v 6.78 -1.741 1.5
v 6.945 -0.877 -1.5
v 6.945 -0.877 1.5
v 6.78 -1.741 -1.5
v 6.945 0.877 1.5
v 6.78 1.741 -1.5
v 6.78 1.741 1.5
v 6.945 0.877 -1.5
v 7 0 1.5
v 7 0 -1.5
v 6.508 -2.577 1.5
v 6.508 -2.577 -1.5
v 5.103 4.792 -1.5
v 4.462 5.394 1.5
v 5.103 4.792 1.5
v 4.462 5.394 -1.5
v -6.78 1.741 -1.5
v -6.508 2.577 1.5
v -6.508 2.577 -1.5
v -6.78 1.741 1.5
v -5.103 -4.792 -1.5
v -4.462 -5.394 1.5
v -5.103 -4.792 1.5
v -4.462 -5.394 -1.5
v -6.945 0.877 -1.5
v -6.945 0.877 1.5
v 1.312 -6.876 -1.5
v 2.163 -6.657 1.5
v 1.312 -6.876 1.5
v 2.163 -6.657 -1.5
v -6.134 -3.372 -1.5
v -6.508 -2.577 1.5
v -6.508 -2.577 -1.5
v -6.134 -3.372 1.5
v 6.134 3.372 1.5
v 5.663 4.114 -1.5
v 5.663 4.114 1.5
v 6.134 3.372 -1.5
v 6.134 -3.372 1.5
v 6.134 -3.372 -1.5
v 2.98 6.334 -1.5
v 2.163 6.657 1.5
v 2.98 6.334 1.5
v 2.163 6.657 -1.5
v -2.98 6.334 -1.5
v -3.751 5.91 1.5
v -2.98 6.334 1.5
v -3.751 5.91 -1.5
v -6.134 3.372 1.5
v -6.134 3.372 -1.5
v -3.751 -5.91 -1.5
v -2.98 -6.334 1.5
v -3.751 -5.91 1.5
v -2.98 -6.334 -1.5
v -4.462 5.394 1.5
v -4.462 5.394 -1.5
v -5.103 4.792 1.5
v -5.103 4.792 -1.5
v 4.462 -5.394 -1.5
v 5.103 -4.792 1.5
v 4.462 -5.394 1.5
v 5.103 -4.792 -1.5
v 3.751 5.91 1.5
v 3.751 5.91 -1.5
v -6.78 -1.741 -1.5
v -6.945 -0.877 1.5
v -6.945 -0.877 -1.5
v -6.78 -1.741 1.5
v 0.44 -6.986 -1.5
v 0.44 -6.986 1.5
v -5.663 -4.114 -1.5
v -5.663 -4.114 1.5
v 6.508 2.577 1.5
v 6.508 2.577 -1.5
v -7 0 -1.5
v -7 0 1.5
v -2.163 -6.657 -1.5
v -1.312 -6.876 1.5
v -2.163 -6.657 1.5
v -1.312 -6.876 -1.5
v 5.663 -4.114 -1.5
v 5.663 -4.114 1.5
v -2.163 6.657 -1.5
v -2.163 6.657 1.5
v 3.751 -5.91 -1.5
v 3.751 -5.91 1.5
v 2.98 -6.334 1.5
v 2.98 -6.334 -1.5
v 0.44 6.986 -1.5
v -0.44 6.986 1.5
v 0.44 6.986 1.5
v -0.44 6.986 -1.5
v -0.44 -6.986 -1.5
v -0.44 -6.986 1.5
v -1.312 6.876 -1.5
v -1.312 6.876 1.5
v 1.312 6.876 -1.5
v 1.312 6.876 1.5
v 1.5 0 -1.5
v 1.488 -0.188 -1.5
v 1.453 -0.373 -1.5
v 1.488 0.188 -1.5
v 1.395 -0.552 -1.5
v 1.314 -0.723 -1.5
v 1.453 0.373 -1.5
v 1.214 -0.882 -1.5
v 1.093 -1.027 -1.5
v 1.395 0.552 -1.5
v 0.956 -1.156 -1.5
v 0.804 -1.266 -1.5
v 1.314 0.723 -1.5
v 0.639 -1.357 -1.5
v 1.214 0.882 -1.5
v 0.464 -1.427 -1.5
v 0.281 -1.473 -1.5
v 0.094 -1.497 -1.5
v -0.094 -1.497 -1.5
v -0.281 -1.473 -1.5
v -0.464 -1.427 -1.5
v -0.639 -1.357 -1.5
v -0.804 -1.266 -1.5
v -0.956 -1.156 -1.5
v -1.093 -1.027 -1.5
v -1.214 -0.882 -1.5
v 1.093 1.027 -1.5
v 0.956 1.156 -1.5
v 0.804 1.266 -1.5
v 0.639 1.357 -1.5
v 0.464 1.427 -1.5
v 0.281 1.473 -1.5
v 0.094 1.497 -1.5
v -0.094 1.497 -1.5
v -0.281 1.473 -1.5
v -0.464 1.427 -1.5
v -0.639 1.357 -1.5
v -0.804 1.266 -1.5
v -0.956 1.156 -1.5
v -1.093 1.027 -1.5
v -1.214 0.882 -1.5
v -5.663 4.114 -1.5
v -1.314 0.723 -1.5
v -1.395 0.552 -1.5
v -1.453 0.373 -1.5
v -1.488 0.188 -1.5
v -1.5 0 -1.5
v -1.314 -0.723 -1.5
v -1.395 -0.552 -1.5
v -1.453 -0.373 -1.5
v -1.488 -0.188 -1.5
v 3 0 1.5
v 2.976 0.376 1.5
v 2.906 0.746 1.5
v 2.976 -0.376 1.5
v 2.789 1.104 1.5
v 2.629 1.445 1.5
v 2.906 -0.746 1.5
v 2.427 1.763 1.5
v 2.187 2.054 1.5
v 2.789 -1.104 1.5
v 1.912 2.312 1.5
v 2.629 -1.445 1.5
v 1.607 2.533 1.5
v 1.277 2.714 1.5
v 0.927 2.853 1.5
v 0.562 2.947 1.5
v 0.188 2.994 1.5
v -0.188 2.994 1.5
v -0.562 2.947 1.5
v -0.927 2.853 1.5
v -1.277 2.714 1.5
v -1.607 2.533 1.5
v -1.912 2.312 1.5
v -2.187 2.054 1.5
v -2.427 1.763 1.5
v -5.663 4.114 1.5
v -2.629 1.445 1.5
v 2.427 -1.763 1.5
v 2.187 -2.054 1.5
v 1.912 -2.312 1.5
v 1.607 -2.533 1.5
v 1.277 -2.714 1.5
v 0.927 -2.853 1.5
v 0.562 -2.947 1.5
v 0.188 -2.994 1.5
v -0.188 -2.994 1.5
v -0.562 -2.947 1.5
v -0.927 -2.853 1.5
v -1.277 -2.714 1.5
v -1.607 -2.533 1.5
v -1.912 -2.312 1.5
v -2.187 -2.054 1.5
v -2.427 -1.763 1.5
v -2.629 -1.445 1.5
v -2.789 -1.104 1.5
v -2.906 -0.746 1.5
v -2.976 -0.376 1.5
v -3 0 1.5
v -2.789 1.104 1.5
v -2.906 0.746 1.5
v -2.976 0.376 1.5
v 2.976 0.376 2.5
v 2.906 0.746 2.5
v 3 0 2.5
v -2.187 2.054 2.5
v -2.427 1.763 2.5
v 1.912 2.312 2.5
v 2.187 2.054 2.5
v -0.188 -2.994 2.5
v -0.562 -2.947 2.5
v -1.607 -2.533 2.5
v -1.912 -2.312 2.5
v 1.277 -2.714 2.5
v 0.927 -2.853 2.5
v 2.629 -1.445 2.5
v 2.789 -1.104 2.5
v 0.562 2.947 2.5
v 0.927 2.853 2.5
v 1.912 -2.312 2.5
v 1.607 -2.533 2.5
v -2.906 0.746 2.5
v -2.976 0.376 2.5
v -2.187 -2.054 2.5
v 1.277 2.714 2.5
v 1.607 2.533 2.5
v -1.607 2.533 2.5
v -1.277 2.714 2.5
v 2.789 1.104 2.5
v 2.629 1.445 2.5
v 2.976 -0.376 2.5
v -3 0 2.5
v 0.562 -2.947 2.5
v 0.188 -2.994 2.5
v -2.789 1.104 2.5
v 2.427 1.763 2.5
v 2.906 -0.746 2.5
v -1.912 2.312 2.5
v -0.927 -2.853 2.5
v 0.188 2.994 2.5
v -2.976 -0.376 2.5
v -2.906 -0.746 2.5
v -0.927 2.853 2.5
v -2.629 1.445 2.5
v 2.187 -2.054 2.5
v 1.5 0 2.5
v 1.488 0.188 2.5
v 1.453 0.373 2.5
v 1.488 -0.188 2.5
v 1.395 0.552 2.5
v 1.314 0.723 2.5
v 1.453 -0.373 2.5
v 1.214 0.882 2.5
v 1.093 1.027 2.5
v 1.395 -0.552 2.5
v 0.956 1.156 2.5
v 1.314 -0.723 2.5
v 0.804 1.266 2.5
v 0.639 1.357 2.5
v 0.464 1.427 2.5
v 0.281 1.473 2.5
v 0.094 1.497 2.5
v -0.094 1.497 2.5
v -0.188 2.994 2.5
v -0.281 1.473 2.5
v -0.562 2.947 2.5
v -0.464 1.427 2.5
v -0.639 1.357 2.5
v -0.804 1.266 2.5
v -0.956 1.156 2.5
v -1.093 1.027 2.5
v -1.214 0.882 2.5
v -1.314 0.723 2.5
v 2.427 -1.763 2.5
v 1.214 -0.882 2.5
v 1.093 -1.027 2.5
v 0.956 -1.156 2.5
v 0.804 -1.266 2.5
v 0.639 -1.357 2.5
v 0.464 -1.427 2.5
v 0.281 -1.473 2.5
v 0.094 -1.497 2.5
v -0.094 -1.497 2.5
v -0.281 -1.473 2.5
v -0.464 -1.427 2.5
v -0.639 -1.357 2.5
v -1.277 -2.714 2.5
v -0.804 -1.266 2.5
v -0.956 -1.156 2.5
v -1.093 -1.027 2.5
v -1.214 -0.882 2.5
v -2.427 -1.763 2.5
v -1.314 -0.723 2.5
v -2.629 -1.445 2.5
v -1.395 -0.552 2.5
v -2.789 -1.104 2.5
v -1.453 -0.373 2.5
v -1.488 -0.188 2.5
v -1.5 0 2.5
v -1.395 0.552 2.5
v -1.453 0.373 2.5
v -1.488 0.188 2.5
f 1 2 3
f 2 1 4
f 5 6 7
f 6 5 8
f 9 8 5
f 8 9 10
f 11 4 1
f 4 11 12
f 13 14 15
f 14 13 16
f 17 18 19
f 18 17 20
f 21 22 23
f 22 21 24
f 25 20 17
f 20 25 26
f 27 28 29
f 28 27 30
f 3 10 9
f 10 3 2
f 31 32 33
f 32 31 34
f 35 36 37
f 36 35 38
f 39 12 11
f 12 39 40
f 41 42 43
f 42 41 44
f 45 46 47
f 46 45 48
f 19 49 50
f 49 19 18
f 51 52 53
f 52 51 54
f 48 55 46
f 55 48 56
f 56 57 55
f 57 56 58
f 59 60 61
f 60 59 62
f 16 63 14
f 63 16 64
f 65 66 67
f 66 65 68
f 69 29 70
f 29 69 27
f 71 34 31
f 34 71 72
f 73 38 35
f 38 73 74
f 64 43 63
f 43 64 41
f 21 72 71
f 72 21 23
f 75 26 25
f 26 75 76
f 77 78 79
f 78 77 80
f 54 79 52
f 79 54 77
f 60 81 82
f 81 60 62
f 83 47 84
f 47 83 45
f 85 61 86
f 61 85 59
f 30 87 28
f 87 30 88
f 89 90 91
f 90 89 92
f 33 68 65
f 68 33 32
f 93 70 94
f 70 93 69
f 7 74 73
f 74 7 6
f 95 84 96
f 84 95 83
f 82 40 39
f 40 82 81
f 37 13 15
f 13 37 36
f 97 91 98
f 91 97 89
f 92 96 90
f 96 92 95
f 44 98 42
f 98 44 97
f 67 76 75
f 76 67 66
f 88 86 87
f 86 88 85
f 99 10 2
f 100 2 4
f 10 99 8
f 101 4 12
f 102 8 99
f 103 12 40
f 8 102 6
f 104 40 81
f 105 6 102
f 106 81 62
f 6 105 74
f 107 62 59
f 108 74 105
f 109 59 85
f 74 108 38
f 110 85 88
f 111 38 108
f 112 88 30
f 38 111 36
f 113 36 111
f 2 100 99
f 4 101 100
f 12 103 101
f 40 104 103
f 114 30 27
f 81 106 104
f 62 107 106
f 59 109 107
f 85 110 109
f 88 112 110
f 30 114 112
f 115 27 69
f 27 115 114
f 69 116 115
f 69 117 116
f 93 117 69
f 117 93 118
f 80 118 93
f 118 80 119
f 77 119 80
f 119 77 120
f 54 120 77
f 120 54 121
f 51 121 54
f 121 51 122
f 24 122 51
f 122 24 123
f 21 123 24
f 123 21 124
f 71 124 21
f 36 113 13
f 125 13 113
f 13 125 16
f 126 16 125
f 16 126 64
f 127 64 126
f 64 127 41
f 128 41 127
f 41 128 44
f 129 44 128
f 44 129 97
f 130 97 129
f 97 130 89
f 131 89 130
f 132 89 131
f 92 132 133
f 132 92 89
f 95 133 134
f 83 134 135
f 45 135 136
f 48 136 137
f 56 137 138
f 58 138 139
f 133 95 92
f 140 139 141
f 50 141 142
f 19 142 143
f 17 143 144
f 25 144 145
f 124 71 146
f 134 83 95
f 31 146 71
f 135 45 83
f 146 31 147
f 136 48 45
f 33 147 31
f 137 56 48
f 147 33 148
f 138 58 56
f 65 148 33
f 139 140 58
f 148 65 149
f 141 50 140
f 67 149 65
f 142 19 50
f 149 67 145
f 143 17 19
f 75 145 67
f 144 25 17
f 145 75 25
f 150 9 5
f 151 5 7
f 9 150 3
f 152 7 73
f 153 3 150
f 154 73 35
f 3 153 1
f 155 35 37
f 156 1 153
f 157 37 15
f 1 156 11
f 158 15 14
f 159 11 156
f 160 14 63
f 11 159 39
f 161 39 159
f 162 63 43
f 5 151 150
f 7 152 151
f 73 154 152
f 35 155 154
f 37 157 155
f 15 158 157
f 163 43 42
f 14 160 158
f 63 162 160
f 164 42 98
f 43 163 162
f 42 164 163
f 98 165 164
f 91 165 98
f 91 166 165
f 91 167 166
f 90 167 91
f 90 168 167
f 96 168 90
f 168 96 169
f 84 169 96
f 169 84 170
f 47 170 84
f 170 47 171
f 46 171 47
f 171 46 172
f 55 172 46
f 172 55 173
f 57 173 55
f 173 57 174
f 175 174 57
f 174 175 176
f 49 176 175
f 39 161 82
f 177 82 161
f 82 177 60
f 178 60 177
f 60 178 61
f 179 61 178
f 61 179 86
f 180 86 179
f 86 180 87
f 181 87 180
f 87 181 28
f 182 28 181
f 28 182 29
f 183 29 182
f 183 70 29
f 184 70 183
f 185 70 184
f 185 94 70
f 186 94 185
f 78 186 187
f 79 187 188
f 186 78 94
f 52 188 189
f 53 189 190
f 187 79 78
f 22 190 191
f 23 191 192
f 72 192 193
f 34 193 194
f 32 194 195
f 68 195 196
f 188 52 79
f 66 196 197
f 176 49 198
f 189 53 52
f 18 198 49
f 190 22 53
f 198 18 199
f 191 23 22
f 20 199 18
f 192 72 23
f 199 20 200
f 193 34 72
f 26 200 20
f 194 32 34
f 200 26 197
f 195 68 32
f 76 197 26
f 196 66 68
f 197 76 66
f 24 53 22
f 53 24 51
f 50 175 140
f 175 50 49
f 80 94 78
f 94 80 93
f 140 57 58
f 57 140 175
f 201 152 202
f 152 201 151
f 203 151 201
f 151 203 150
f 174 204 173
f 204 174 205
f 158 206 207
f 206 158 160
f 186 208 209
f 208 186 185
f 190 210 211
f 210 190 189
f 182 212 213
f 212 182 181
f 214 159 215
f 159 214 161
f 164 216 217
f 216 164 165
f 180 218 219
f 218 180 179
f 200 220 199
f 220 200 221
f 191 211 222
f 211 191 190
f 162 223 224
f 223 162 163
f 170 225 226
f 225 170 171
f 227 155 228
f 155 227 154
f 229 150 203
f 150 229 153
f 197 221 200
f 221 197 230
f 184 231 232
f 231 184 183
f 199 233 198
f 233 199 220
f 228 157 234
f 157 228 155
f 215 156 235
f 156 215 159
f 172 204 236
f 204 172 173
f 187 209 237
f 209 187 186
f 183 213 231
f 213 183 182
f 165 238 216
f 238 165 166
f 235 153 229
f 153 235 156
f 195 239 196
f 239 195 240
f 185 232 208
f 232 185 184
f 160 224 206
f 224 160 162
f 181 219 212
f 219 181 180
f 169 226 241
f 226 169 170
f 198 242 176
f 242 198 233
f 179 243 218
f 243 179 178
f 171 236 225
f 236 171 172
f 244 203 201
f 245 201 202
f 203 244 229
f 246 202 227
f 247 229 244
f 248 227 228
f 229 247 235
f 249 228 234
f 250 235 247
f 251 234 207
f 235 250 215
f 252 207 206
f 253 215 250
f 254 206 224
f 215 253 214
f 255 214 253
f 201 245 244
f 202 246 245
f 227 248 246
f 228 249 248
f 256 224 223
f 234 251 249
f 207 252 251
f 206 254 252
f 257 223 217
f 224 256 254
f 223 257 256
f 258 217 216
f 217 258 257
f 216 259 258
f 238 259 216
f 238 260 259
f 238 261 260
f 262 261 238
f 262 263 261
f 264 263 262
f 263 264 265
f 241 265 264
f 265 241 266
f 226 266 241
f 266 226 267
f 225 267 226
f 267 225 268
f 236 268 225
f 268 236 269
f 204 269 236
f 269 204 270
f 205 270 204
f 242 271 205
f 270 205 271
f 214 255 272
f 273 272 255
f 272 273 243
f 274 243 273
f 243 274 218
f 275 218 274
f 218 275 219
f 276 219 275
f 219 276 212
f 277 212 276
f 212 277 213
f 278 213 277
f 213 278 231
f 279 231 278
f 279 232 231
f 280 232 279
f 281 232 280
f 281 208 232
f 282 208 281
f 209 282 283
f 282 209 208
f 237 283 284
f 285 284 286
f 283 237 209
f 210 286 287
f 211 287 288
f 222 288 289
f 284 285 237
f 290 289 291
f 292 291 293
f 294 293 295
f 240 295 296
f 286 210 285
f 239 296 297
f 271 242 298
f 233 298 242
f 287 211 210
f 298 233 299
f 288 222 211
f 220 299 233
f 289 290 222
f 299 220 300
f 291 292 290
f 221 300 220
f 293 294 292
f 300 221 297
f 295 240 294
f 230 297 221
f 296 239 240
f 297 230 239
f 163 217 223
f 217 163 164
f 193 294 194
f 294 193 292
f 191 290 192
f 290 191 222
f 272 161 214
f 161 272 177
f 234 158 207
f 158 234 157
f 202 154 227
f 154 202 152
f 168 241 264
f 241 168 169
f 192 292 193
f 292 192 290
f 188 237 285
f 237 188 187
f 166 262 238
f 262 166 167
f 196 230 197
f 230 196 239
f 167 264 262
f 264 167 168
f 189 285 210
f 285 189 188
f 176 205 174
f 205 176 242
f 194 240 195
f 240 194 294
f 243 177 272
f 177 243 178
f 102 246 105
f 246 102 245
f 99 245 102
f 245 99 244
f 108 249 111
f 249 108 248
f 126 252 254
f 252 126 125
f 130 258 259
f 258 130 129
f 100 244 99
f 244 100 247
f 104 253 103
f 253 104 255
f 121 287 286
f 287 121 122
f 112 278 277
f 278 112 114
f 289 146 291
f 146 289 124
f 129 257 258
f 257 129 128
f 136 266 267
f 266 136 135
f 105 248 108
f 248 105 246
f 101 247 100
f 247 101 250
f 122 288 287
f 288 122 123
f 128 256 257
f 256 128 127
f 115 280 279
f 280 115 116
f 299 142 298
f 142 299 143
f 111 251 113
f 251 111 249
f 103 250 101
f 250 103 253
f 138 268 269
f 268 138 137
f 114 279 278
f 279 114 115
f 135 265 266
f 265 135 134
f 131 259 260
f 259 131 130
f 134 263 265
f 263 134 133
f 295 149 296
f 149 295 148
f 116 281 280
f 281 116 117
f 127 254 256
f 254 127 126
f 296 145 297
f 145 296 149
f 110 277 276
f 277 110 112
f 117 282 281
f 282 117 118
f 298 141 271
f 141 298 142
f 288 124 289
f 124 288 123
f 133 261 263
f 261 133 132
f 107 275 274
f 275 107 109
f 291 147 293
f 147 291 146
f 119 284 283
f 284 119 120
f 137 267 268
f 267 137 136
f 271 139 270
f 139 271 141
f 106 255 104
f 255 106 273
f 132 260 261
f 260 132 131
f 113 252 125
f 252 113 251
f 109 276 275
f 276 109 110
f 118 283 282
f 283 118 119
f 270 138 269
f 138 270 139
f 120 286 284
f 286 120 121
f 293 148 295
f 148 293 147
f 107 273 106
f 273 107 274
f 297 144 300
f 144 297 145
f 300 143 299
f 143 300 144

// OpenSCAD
$fn = 50;


difference() {
	union() {
		translate(v = [0, 0, -1.5000000000]) {
			cylinder(h = 3, r = 7.0000000000);
		}
		translate(v = [0, 0, -1.5000000000]) {
			cylinder(h = 4, r = 3.0000000000);
		}
	}
	union() {
		translate(v = [0, 0, -100.0000000000]) {
			cylinder(h = 200, r = 1.5000000000);
		}
	}
}
